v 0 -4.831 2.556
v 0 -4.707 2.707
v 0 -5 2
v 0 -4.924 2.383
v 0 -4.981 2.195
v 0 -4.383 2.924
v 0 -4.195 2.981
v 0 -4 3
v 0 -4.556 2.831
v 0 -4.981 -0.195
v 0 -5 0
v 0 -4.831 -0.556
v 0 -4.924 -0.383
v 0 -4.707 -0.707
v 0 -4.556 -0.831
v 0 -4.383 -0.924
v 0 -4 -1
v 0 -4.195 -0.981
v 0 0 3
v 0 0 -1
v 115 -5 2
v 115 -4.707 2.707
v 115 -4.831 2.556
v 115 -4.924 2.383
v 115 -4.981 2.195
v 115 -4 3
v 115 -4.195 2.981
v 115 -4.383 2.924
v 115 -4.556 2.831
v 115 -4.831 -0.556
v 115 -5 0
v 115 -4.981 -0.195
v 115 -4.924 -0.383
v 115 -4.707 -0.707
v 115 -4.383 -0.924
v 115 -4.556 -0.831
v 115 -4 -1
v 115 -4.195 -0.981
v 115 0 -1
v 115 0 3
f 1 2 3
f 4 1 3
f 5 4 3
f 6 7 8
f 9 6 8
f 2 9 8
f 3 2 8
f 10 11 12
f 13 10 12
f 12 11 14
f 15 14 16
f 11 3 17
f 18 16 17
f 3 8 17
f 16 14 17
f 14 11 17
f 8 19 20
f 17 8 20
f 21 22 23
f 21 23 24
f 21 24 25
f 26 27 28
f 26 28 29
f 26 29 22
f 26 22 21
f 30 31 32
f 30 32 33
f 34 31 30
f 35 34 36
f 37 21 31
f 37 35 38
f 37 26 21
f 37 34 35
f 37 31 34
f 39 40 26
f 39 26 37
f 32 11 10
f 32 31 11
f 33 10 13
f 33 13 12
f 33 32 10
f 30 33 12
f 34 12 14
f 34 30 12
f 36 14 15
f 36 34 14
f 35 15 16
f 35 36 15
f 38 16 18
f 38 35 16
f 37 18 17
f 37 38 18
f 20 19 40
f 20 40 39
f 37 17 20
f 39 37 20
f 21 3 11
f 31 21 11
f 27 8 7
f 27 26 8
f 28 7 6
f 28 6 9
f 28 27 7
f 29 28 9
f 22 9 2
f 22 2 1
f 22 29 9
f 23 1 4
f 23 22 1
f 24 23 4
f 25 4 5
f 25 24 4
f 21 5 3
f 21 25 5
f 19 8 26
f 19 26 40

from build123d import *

# Parameters (mm, degrees)
SKIZZE1_W                       = 4
SKIZZE1_H                       = 5
AUFSATZ_LINEAR_AUSTRAGEN1_DEPTH = 115
VERRUNDUNG1_R                   = 1


with BuildPart() as part:
    # Skizze1 → Aufsatz-Linear austragen1 (new body)
    with BuildSketch(Plane(origin=(0, 0, 0), x_dir=(0, 0, -1), z_dir=(1, 0, 0))):
        with Locations((-1, -2.5)):
            Rectangle(SKIZZE1_W, SKIZZE1_H)
    extrude(amount=AUFSATZ_LINEAR_AUSTRAGEN1_DEPTH)

    # Verrundung1
    verrundung1_edges = [part.edges().sort_by_distance(p)[0] for p in [
        (57.5, -5, -1),
        (57.5, -5, 3),
    ]]
    fillet(verrundung1_edges, radius=VERRUNDUNG1_R)


solid = part.part
